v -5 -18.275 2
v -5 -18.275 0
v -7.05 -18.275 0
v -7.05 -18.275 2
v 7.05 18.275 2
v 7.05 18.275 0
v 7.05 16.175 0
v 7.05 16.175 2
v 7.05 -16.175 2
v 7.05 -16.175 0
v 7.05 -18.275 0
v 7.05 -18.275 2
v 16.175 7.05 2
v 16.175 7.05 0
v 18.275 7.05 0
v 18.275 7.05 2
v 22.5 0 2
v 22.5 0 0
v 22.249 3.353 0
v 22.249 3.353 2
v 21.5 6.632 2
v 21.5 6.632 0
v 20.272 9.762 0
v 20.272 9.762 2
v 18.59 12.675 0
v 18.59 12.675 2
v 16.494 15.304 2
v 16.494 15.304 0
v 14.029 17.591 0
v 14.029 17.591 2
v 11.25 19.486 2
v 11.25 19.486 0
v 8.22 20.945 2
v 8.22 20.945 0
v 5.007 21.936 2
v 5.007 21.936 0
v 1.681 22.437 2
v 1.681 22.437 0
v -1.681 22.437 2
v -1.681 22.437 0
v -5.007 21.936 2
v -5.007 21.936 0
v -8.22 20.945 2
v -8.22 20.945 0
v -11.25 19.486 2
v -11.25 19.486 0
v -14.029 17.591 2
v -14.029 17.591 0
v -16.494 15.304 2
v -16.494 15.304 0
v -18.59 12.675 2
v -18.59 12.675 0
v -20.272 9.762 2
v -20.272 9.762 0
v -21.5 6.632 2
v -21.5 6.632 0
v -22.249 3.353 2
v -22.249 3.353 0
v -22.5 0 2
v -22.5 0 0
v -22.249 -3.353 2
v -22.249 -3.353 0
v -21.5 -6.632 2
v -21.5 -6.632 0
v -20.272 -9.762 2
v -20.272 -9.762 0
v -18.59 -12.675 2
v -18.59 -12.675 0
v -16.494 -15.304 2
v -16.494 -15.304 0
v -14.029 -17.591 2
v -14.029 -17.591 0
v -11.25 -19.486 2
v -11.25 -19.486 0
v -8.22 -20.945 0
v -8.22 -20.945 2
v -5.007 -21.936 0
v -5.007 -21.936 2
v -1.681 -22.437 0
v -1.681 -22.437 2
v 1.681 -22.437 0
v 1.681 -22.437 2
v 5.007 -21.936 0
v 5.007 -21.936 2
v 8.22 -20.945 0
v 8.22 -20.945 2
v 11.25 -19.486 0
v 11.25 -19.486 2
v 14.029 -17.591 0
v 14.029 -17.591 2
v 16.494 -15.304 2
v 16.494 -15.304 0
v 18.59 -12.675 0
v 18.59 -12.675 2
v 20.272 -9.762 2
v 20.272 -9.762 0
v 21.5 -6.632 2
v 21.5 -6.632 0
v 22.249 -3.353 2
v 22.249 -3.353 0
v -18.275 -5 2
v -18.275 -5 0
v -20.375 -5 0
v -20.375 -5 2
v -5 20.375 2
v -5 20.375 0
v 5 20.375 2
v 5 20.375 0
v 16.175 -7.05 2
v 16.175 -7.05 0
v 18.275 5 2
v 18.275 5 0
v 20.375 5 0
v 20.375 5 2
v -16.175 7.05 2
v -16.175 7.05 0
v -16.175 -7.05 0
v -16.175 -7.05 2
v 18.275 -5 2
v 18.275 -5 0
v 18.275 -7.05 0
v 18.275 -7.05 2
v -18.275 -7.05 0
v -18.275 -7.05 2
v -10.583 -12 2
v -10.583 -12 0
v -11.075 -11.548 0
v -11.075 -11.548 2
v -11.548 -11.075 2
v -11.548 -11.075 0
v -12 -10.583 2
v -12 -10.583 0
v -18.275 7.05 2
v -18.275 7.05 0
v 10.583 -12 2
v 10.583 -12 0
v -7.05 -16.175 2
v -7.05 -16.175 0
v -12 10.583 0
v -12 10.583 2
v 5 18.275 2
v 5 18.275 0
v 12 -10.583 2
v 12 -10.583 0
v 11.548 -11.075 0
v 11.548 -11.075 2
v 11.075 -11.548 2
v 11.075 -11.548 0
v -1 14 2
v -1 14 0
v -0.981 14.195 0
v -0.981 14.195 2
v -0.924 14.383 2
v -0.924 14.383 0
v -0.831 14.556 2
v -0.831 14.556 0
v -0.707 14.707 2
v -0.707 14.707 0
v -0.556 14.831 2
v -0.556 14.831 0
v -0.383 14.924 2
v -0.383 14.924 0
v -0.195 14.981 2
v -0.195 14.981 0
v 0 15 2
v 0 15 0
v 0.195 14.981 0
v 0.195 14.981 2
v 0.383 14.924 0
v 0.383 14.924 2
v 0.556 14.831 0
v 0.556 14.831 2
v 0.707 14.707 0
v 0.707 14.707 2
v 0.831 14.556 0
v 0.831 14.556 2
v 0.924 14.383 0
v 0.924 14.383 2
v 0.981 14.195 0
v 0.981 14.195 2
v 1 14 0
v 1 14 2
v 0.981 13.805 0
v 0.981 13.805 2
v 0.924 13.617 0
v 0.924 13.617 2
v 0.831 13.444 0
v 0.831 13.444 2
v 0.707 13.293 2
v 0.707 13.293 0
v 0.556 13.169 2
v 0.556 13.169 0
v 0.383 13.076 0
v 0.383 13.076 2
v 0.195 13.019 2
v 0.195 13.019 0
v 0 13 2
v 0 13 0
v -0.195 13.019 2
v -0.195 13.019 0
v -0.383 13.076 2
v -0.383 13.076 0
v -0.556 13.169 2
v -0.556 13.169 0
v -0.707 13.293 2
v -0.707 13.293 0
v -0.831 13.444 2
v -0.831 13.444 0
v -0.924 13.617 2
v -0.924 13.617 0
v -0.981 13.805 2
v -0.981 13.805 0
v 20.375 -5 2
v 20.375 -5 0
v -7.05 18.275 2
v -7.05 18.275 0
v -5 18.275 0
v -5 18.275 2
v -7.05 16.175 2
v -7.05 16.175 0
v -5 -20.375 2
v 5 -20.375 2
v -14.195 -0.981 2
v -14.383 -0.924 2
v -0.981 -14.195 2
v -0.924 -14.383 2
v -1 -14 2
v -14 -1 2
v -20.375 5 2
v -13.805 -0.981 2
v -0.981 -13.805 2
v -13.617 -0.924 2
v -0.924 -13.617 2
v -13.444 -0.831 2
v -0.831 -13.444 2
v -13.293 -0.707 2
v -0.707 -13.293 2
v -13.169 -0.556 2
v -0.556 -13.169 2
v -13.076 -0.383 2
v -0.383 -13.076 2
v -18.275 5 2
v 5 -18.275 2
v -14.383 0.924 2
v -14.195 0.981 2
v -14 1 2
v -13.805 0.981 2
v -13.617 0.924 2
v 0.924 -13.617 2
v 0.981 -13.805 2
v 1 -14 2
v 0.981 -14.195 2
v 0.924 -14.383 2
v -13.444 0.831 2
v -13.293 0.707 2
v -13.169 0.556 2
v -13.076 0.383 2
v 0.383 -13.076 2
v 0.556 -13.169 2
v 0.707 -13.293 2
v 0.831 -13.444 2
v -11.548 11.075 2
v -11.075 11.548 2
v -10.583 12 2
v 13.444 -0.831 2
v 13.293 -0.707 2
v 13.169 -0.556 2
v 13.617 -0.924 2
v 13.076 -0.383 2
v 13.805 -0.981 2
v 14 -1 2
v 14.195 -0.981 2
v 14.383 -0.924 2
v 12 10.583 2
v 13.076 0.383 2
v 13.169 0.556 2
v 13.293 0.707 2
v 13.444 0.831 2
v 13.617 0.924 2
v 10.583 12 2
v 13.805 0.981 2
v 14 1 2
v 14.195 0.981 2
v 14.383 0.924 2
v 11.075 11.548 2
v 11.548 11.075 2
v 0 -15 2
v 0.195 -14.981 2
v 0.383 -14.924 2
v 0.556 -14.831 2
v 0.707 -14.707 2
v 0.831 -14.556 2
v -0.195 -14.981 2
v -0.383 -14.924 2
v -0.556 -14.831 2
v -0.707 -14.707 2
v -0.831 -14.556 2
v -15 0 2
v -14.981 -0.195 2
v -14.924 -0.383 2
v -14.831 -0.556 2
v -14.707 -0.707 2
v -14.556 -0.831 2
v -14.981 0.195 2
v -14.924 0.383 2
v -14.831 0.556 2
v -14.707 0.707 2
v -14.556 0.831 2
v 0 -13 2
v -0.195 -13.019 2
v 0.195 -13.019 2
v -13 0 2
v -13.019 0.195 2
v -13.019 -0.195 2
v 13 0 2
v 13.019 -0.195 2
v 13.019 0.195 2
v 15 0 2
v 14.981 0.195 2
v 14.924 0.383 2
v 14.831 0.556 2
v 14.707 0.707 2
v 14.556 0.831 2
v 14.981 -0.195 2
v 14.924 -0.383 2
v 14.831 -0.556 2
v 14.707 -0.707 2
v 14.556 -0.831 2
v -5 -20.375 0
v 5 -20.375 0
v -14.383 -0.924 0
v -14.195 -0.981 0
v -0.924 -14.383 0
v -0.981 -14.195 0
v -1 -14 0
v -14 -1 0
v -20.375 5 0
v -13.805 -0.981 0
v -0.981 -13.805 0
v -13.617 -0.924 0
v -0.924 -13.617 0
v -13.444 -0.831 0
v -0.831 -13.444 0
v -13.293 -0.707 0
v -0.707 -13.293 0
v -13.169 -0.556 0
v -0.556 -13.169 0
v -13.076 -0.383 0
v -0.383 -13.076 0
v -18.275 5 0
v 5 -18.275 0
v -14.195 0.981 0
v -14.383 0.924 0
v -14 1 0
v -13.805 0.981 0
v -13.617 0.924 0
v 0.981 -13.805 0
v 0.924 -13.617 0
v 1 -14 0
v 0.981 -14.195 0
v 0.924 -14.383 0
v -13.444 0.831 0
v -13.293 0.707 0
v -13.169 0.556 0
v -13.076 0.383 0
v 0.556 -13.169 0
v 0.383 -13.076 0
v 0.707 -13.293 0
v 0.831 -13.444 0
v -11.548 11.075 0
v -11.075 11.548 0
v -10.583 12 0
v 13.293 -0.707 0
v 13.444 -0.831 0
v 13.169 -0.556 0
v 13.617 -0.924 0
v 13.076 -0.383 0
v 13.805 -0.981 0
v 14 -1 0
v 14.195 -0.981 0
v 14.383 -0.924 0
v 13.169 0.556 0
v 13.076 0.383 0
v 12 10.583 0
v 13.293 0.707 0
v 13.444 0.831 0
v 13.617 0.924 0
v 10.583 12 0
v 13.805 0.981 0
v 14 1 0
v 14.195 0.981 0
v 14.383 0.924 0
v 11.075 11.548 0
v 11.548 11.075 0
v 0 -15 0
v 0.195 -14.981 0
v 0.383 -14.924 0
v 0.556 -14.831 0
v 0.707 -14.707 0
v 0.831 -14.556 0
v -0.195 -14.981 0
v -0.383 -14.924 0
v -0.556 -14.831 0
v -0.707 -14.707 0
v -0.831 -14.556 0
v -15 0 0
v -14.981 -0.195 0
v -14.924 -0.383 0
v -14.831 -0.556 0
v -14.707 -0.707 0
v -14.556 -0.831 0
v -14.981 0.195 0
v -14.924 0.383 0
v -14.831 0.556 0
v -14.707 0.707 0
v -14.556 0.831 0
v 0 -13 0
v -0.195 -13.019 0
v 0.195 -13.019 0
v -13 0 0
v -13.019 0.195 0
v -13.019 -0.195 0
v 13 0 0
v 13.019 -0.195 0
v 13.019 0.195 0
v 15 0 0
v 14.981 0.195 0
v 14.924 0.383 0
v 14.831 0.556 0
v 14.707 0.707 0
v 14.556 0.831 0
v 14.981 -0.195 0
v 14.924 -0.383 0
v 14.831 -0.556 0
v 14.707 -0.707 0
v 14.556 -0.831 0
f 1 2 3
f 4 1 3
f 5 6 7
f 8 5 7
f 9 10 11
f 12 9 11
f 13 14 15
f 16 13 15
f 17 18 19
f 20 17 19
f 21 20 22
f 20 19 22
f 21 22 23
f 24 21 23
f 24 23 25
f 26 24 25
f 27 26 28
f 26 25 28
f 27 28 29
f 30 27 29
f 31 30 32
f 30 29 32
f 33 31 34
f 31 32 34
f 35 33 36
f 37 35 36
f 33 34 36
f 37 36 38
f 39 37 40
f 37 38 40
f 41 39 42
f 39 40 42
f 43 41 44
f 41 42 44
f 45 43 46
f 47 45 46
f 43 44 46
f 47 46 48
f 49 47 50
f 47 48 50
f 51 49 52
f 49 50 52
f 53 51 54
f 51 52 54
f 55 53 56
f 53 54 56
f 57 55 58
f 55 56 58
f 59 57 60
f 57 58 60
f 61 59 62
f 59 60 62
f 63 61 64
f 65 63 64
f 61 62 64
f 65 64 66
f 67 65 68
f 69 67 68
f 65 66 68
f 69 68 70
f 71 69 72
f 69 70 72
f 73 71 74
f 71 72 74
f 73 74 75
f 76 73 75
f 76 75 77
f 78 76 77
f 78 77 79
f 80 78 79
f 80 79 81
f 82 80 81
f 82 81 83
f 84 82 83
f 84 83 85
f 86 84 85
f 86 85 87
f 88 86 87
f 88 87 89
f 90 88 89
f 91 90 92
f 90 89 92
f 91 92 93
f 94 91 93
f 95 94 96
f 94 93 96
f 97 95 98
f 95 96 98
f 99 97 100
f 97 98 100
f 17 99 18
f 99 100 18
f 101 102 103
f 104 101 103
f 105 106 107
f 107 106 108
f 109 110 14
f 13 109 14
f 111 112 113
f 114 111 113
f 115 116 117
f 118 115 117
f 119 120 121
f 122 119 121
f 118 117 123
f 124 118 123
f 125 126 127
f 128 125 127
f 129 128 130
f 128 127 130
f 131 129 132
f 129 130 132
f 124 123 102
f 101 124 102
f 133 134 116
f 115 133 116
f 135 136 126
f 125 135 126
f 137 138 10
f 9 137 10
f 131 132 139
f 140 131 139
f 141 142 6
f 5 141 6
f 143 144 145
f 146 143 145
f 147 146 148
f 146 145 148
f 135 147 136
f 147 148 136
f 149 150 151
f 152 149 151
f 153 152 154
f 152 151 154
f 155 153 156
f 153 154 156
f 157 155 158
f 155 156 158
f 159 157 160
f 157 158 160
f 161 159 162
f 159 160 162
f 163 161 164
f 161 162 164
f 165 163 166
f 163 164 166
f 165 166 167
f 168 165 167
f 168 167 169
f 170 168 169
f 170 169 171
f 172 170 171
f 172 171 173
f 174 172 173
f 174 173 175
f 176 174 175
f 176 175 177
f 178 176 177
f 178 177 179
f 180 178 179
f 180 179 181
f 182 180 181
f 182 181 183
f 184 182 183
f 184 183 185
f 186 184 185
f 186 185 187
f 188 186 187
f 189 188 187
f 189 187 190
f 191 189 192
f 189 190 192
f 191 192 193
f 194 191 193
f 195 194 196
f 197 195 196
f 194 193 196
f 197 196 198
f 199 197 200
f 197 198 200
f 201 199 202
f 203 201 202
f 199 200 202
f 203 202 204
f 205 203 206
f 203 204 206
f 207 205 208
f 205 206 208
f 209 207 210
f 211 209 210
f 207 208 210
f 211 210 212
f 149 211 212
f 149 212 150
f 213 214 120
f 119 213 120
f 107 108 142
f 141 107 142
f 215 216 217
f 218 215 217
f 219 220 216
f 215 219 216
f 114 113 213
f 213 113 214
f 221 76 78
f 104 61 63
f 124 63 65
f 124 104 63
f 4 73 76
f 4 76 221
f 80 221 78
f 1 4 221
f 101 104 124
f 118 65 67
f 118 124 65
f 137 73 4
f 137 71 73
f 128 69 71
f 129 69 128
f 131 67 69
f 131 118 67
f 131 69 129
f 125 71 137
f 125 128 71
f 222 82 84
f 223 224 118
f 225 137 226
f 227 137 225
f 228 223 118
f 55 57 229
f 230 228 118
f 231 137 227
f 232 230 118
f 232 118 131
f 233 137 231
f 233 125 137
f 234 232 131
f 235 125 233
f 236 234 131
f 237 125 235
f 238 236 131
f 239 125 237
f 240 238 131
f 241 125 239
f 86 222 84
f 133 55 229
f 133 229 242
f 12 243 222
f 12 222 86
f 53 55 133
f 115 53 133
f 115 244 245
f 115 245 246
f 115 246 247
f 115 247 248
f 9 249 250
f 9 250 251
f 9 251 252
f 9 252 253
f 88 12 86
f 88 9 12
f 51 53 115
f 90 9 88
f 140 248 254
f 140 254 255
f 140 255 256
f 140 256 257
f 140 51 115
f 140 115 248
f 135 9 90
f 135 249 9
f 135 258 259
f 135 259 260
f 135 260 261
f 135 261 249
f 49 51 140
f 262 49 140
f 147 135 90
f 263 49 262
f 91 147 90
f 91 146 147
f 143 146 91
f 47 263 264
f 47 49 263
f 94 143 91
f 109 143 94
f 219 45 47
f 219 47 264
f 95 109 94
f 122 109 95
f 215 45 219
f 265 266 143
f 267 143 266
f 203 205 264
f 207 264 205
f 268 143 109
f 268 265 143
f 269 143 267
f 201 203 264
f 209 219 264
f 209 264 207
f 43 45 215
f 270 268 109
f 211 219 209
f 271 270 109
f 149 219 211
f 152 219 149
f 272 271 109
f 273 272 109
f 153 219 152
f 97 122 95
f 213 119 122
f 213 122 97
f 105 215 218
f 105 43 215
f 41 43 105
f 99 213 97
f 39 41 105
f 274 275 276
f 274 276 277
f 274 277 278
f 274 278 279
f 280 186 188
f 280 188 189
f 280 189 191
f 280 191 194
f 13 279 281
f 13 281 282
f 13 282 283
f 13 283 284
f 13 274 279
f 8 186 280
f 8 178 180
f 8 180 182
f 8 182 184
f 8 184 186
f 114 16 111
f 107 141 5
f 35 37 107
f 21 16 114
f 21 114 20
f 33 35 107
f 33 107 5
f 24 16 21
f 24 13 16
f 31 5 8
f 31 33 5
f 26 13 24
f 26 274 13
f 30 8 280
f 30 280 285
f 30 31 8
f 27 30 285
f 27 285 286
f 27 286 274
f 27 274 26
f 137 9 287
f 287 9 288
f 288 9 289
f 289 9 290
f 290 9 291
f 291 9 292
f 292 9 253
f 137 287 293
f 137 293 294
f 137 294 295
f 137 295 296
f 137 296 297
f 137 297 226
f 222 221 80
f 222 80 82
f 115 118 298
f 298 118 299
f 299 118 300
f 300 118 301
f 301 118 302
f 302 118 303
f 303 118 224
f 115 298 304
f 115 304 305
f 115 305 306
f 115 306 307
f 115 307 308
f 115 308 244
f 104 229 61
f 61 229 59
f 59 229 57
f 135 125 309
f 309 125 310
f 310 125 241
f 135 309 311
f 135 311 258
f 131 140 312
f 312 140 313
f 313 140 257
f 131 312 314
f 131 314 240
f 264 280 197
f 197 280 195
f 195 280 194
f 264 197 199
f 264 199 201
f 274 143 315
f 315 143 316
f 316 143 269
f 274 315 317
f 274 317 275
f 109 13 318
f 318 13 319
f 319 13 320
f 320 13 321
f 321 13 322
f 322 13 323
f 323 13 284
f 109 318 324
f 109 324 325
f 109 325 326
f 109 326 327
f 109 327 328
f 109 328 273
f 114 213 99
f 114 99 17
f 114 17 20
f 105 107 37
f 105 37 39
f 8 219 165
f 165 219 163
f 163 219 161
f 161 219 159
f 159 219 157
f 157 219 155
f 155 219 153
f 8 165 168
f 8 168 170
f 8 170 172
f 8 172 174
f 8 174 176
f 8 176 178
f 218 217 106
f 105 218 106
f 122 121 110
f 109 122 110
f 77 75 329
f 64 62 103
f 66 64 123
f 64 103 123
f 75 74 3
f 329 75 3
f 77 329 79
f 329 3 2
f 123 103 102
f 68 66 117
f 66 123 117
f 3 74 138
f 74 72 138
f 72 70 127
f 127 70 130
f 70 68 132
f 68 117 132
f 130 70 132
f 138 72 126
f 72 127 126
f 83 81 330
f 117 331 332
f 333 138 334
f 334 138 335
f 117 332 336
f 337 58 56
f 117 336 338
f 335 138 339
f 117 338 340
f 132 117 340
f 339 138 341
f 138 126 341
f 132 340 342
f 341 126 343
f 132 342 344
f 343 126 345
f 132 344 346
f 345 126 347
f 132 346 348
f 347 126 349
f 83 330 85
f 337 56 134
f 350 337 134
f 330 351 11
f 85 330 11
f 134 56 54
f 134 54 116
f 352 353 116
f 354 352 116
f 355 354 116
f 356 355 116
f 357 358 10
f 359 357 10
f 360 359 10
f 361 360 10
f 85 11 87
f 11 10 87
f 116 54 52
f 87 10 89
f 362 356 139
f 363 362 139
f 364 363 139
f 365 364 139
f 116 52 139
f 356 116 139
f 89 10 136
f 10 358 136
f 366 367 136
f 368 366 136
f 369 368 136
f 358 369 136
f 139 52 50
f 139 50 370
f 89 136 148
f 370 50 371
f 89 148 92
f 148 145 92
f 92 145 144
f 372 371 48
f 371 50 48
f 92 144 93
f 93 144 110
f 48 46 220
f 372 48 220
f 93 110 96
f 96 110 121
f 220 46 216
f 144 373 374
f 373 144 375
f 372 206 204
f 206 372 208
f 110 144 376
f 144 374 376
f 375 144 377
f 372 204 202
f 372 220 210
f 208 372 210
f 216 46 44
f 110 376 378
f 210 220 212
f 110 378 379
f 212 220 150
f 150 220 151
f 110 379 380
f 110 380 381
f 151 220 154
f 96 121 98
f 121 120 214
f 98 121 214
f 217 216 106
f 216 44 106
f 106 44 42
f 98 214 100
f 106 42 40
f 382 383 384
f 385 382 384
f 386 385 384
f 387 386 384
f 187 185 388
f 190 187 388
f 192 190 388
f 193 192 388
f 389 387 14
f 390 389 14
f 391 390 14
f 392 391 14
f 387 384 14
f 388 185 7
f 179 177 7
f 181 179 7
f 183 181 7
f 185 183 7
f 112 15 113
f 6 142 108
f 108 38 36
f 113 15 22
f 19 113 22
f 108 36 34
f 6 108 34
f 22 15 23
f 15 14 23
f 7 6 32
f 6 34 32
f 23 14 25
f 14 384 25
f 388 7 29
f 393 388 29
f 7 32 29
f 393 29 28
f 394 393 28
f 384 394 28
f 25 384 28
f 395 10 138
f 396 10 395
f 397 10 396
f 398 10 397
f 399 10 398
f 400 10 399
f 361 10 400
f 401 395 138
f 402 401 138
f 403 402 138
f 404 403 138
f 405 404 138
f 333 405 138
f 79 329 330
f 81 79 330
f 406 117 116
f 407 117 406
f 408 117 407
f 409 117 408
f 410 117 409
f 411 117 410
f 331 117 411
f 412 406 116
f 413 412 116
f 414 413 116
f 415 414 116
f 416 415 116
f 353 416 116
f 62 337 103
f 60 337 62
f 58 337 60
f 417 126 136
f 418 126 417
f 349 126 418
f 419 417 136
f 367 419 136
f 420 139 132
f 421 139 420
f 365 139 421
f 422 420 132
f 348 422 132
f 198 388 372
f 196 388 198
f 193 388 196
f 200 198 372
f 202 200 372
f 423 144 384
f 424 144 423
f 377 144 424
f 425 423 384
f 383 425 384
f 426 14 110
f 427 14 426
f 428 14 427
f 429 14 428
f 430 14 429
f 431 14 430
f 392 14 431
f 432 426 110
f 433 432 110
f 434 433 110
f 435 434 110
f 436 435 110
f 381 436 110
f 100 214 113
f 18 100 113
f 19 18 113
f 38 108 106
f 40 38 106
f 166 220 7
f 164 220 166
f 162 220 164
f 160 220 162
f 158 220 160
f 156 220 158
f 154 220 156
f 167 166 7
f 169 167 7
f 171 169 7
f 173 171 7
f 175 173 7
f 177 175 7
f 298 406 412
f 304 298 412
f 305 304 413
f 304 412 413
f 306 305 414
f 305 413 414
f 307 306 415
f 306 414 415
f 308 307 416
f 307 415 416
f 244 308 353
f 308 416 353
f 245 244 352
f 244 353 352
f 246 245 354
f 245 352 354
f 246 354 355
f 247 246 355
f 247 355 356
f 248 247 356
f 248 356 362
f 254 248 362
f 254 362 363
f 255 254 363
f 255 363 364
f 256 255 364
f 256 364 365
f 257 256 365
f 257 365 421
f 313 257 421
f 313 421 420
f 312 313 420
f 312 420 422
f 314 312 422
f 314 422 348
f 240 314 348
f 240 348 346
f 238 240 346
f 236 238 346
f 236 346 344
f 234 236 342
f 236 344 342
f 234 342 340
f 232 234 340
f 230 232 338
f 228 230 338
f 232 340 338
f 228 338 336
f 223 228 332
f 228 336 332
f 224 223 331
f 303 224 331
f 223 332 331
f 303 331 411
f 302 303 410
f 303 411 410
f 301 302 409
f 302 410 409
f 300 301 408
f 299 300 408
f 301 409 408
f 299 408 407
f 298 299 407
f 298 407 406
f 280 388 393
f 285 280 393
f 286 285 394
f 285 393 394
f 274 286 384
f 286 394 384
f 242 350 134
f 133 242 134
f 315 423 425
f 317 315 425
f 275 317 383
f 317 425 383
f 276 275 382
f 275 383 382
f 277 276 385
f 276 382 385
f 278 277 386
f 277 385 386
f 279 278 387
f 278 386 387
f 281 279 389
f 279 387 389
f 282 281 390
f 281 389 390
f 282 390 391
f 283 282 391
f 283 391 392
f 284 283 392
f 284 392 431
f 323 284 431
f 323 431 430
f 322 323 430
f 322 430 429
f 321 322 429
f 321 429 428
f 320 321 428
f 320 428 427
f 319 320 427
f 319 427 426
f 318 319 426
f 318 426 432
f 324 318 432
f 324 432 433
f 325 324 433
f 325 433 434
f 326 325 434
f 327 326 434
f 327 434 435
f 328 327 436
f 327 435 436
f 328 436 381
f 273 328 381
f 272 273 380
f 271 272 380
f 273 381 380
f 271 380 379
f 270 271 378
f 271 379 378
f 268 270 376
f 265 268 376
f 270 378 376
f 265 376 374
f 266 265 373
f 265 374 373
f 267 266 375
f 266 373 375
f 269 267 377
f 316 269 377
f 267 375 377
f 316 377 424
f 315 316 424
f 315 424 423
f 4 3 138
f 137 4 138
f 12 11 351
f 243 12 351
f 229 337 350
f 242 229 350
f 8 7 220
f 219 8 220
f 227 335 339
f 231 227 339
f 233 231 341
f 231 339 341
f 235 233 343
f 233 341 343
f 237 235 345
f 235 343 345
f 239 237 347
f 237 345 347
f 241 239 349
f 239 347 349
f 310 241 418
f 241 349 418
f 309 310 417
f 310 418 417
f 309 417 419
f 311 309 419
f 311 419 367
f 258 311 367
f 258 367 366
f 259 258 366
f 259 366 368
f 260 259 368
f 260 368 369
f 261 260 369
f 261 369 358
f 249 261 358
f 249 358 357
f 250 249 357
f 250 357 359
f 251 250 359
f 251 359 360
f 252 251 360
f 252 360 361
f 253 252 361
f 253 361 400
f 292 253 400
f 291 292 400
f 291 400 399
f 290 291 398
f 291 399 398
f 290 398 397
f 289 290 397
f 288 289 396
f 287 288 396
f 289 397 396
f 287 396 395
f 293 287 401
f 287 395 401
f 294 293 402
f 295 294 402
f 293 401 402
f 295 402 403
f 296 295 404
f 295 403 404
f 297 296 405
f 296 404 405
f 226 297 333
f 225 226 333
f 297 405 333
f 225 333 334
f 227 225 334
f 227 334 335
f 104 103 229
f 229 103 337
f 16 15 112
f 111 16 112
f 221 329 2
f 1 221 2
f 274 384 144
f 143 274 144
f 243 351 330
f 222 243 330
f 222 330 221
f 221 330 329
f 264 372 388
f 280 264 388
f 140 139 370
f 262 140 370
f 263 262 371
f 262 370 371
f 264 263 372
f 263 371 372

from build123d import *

# Parameters (mm, degrees)
SKETCH_1_R      = 22.5
EXTRUDE_1_DEPTH = 2
MM_1_D          = 2
MM_1_DEPTH      = 5.2
MM_1_TIP        = 0.600860619


with BuildPart() as part:
    # 草图1 → 凸台-拉伸1 (new body)
    with BuildSketch(Plane.XY):
        Circle(SKETCH_1_R)
        with BuildLine():
            Line((10.583005244, -12), (-10.583005244, -12))
            ThreePointArc((-10.583005244, -12), (-11.313708499, -11.313708499), (-12, -10.583005244))
            Line((-12, -10.583005244), (-12, 10.583005244))
            ThreePointArc((-12, 10.583005244), (-11.313708499, 11.313708499), (-10.583005244, 12))
            Line((-10.583005244, 12), (10.583005244, 12))
            ThreePointArc((10.583005244, 12), (11.313708499, 11.313708499), (12, 10.583005244))
            Line((12, 10.583005244), (12, -10.583005244))
            ThreePointArc((12, -10.583005244), (11.313708499, -11.313708499), (10.583005244, -12))
        make_face(mode=Mode.SUBTRACT)
        Polygon((-5, 18.275), (-5, 20.375), (5, 20.375), (5, 18.275), (7.05, 18.275), (7.05, 16.175), (-7.05, 16.175), (-7.05, 18.275), align=None, mode=Mode.SUBTRACT)
        Polygon((-18.275, 7.05), (-16.175, 7.05), (-16.175, -7.05), (-18.275, -7.05), (-18.275, -5), (-20.375, -5), (-20.375, 5), (-18.275, 5), align=None, mode=Mode.SUBTRACT)
        Polygon((-7.05, -18.275), (-7.05, -16.175), (7.05, -16.175), (7.05, -18.275), (5, -18.275), (5, -20.375), (-5, -20.375), (-5, -18.275), align=None, mode=Mode.SUBTRACT)
        Polygon((18.275, -7.05), (16.175, -7.05), (16.175, 7.05), (18.275, 7.05), (18.275, 5), (20.375, 5), (20.375, -5), (18.275, -5), align=None, mode=Mode.SUBTRACT)
    extrude(amount=EXTRUDE_1_DEPTH)

    # 大小mm 暗销孔1
    with Locations(Plane.XY.offset(2)):
        with Locations((0, 14), (-14, 0), (0, -14), (14, 0)):
            Hole(MM_1_D / 2, depth=MM_1_DEPTH)
            with Locations((0, 0, -(MM_1_DEPTH + MM_1_TIP / 2))):  # 118° drill point
                Cone(0, MM_1_D / 2, MM_1_TIP, mode=Mode.SUBTRACT)


solid = part.part
